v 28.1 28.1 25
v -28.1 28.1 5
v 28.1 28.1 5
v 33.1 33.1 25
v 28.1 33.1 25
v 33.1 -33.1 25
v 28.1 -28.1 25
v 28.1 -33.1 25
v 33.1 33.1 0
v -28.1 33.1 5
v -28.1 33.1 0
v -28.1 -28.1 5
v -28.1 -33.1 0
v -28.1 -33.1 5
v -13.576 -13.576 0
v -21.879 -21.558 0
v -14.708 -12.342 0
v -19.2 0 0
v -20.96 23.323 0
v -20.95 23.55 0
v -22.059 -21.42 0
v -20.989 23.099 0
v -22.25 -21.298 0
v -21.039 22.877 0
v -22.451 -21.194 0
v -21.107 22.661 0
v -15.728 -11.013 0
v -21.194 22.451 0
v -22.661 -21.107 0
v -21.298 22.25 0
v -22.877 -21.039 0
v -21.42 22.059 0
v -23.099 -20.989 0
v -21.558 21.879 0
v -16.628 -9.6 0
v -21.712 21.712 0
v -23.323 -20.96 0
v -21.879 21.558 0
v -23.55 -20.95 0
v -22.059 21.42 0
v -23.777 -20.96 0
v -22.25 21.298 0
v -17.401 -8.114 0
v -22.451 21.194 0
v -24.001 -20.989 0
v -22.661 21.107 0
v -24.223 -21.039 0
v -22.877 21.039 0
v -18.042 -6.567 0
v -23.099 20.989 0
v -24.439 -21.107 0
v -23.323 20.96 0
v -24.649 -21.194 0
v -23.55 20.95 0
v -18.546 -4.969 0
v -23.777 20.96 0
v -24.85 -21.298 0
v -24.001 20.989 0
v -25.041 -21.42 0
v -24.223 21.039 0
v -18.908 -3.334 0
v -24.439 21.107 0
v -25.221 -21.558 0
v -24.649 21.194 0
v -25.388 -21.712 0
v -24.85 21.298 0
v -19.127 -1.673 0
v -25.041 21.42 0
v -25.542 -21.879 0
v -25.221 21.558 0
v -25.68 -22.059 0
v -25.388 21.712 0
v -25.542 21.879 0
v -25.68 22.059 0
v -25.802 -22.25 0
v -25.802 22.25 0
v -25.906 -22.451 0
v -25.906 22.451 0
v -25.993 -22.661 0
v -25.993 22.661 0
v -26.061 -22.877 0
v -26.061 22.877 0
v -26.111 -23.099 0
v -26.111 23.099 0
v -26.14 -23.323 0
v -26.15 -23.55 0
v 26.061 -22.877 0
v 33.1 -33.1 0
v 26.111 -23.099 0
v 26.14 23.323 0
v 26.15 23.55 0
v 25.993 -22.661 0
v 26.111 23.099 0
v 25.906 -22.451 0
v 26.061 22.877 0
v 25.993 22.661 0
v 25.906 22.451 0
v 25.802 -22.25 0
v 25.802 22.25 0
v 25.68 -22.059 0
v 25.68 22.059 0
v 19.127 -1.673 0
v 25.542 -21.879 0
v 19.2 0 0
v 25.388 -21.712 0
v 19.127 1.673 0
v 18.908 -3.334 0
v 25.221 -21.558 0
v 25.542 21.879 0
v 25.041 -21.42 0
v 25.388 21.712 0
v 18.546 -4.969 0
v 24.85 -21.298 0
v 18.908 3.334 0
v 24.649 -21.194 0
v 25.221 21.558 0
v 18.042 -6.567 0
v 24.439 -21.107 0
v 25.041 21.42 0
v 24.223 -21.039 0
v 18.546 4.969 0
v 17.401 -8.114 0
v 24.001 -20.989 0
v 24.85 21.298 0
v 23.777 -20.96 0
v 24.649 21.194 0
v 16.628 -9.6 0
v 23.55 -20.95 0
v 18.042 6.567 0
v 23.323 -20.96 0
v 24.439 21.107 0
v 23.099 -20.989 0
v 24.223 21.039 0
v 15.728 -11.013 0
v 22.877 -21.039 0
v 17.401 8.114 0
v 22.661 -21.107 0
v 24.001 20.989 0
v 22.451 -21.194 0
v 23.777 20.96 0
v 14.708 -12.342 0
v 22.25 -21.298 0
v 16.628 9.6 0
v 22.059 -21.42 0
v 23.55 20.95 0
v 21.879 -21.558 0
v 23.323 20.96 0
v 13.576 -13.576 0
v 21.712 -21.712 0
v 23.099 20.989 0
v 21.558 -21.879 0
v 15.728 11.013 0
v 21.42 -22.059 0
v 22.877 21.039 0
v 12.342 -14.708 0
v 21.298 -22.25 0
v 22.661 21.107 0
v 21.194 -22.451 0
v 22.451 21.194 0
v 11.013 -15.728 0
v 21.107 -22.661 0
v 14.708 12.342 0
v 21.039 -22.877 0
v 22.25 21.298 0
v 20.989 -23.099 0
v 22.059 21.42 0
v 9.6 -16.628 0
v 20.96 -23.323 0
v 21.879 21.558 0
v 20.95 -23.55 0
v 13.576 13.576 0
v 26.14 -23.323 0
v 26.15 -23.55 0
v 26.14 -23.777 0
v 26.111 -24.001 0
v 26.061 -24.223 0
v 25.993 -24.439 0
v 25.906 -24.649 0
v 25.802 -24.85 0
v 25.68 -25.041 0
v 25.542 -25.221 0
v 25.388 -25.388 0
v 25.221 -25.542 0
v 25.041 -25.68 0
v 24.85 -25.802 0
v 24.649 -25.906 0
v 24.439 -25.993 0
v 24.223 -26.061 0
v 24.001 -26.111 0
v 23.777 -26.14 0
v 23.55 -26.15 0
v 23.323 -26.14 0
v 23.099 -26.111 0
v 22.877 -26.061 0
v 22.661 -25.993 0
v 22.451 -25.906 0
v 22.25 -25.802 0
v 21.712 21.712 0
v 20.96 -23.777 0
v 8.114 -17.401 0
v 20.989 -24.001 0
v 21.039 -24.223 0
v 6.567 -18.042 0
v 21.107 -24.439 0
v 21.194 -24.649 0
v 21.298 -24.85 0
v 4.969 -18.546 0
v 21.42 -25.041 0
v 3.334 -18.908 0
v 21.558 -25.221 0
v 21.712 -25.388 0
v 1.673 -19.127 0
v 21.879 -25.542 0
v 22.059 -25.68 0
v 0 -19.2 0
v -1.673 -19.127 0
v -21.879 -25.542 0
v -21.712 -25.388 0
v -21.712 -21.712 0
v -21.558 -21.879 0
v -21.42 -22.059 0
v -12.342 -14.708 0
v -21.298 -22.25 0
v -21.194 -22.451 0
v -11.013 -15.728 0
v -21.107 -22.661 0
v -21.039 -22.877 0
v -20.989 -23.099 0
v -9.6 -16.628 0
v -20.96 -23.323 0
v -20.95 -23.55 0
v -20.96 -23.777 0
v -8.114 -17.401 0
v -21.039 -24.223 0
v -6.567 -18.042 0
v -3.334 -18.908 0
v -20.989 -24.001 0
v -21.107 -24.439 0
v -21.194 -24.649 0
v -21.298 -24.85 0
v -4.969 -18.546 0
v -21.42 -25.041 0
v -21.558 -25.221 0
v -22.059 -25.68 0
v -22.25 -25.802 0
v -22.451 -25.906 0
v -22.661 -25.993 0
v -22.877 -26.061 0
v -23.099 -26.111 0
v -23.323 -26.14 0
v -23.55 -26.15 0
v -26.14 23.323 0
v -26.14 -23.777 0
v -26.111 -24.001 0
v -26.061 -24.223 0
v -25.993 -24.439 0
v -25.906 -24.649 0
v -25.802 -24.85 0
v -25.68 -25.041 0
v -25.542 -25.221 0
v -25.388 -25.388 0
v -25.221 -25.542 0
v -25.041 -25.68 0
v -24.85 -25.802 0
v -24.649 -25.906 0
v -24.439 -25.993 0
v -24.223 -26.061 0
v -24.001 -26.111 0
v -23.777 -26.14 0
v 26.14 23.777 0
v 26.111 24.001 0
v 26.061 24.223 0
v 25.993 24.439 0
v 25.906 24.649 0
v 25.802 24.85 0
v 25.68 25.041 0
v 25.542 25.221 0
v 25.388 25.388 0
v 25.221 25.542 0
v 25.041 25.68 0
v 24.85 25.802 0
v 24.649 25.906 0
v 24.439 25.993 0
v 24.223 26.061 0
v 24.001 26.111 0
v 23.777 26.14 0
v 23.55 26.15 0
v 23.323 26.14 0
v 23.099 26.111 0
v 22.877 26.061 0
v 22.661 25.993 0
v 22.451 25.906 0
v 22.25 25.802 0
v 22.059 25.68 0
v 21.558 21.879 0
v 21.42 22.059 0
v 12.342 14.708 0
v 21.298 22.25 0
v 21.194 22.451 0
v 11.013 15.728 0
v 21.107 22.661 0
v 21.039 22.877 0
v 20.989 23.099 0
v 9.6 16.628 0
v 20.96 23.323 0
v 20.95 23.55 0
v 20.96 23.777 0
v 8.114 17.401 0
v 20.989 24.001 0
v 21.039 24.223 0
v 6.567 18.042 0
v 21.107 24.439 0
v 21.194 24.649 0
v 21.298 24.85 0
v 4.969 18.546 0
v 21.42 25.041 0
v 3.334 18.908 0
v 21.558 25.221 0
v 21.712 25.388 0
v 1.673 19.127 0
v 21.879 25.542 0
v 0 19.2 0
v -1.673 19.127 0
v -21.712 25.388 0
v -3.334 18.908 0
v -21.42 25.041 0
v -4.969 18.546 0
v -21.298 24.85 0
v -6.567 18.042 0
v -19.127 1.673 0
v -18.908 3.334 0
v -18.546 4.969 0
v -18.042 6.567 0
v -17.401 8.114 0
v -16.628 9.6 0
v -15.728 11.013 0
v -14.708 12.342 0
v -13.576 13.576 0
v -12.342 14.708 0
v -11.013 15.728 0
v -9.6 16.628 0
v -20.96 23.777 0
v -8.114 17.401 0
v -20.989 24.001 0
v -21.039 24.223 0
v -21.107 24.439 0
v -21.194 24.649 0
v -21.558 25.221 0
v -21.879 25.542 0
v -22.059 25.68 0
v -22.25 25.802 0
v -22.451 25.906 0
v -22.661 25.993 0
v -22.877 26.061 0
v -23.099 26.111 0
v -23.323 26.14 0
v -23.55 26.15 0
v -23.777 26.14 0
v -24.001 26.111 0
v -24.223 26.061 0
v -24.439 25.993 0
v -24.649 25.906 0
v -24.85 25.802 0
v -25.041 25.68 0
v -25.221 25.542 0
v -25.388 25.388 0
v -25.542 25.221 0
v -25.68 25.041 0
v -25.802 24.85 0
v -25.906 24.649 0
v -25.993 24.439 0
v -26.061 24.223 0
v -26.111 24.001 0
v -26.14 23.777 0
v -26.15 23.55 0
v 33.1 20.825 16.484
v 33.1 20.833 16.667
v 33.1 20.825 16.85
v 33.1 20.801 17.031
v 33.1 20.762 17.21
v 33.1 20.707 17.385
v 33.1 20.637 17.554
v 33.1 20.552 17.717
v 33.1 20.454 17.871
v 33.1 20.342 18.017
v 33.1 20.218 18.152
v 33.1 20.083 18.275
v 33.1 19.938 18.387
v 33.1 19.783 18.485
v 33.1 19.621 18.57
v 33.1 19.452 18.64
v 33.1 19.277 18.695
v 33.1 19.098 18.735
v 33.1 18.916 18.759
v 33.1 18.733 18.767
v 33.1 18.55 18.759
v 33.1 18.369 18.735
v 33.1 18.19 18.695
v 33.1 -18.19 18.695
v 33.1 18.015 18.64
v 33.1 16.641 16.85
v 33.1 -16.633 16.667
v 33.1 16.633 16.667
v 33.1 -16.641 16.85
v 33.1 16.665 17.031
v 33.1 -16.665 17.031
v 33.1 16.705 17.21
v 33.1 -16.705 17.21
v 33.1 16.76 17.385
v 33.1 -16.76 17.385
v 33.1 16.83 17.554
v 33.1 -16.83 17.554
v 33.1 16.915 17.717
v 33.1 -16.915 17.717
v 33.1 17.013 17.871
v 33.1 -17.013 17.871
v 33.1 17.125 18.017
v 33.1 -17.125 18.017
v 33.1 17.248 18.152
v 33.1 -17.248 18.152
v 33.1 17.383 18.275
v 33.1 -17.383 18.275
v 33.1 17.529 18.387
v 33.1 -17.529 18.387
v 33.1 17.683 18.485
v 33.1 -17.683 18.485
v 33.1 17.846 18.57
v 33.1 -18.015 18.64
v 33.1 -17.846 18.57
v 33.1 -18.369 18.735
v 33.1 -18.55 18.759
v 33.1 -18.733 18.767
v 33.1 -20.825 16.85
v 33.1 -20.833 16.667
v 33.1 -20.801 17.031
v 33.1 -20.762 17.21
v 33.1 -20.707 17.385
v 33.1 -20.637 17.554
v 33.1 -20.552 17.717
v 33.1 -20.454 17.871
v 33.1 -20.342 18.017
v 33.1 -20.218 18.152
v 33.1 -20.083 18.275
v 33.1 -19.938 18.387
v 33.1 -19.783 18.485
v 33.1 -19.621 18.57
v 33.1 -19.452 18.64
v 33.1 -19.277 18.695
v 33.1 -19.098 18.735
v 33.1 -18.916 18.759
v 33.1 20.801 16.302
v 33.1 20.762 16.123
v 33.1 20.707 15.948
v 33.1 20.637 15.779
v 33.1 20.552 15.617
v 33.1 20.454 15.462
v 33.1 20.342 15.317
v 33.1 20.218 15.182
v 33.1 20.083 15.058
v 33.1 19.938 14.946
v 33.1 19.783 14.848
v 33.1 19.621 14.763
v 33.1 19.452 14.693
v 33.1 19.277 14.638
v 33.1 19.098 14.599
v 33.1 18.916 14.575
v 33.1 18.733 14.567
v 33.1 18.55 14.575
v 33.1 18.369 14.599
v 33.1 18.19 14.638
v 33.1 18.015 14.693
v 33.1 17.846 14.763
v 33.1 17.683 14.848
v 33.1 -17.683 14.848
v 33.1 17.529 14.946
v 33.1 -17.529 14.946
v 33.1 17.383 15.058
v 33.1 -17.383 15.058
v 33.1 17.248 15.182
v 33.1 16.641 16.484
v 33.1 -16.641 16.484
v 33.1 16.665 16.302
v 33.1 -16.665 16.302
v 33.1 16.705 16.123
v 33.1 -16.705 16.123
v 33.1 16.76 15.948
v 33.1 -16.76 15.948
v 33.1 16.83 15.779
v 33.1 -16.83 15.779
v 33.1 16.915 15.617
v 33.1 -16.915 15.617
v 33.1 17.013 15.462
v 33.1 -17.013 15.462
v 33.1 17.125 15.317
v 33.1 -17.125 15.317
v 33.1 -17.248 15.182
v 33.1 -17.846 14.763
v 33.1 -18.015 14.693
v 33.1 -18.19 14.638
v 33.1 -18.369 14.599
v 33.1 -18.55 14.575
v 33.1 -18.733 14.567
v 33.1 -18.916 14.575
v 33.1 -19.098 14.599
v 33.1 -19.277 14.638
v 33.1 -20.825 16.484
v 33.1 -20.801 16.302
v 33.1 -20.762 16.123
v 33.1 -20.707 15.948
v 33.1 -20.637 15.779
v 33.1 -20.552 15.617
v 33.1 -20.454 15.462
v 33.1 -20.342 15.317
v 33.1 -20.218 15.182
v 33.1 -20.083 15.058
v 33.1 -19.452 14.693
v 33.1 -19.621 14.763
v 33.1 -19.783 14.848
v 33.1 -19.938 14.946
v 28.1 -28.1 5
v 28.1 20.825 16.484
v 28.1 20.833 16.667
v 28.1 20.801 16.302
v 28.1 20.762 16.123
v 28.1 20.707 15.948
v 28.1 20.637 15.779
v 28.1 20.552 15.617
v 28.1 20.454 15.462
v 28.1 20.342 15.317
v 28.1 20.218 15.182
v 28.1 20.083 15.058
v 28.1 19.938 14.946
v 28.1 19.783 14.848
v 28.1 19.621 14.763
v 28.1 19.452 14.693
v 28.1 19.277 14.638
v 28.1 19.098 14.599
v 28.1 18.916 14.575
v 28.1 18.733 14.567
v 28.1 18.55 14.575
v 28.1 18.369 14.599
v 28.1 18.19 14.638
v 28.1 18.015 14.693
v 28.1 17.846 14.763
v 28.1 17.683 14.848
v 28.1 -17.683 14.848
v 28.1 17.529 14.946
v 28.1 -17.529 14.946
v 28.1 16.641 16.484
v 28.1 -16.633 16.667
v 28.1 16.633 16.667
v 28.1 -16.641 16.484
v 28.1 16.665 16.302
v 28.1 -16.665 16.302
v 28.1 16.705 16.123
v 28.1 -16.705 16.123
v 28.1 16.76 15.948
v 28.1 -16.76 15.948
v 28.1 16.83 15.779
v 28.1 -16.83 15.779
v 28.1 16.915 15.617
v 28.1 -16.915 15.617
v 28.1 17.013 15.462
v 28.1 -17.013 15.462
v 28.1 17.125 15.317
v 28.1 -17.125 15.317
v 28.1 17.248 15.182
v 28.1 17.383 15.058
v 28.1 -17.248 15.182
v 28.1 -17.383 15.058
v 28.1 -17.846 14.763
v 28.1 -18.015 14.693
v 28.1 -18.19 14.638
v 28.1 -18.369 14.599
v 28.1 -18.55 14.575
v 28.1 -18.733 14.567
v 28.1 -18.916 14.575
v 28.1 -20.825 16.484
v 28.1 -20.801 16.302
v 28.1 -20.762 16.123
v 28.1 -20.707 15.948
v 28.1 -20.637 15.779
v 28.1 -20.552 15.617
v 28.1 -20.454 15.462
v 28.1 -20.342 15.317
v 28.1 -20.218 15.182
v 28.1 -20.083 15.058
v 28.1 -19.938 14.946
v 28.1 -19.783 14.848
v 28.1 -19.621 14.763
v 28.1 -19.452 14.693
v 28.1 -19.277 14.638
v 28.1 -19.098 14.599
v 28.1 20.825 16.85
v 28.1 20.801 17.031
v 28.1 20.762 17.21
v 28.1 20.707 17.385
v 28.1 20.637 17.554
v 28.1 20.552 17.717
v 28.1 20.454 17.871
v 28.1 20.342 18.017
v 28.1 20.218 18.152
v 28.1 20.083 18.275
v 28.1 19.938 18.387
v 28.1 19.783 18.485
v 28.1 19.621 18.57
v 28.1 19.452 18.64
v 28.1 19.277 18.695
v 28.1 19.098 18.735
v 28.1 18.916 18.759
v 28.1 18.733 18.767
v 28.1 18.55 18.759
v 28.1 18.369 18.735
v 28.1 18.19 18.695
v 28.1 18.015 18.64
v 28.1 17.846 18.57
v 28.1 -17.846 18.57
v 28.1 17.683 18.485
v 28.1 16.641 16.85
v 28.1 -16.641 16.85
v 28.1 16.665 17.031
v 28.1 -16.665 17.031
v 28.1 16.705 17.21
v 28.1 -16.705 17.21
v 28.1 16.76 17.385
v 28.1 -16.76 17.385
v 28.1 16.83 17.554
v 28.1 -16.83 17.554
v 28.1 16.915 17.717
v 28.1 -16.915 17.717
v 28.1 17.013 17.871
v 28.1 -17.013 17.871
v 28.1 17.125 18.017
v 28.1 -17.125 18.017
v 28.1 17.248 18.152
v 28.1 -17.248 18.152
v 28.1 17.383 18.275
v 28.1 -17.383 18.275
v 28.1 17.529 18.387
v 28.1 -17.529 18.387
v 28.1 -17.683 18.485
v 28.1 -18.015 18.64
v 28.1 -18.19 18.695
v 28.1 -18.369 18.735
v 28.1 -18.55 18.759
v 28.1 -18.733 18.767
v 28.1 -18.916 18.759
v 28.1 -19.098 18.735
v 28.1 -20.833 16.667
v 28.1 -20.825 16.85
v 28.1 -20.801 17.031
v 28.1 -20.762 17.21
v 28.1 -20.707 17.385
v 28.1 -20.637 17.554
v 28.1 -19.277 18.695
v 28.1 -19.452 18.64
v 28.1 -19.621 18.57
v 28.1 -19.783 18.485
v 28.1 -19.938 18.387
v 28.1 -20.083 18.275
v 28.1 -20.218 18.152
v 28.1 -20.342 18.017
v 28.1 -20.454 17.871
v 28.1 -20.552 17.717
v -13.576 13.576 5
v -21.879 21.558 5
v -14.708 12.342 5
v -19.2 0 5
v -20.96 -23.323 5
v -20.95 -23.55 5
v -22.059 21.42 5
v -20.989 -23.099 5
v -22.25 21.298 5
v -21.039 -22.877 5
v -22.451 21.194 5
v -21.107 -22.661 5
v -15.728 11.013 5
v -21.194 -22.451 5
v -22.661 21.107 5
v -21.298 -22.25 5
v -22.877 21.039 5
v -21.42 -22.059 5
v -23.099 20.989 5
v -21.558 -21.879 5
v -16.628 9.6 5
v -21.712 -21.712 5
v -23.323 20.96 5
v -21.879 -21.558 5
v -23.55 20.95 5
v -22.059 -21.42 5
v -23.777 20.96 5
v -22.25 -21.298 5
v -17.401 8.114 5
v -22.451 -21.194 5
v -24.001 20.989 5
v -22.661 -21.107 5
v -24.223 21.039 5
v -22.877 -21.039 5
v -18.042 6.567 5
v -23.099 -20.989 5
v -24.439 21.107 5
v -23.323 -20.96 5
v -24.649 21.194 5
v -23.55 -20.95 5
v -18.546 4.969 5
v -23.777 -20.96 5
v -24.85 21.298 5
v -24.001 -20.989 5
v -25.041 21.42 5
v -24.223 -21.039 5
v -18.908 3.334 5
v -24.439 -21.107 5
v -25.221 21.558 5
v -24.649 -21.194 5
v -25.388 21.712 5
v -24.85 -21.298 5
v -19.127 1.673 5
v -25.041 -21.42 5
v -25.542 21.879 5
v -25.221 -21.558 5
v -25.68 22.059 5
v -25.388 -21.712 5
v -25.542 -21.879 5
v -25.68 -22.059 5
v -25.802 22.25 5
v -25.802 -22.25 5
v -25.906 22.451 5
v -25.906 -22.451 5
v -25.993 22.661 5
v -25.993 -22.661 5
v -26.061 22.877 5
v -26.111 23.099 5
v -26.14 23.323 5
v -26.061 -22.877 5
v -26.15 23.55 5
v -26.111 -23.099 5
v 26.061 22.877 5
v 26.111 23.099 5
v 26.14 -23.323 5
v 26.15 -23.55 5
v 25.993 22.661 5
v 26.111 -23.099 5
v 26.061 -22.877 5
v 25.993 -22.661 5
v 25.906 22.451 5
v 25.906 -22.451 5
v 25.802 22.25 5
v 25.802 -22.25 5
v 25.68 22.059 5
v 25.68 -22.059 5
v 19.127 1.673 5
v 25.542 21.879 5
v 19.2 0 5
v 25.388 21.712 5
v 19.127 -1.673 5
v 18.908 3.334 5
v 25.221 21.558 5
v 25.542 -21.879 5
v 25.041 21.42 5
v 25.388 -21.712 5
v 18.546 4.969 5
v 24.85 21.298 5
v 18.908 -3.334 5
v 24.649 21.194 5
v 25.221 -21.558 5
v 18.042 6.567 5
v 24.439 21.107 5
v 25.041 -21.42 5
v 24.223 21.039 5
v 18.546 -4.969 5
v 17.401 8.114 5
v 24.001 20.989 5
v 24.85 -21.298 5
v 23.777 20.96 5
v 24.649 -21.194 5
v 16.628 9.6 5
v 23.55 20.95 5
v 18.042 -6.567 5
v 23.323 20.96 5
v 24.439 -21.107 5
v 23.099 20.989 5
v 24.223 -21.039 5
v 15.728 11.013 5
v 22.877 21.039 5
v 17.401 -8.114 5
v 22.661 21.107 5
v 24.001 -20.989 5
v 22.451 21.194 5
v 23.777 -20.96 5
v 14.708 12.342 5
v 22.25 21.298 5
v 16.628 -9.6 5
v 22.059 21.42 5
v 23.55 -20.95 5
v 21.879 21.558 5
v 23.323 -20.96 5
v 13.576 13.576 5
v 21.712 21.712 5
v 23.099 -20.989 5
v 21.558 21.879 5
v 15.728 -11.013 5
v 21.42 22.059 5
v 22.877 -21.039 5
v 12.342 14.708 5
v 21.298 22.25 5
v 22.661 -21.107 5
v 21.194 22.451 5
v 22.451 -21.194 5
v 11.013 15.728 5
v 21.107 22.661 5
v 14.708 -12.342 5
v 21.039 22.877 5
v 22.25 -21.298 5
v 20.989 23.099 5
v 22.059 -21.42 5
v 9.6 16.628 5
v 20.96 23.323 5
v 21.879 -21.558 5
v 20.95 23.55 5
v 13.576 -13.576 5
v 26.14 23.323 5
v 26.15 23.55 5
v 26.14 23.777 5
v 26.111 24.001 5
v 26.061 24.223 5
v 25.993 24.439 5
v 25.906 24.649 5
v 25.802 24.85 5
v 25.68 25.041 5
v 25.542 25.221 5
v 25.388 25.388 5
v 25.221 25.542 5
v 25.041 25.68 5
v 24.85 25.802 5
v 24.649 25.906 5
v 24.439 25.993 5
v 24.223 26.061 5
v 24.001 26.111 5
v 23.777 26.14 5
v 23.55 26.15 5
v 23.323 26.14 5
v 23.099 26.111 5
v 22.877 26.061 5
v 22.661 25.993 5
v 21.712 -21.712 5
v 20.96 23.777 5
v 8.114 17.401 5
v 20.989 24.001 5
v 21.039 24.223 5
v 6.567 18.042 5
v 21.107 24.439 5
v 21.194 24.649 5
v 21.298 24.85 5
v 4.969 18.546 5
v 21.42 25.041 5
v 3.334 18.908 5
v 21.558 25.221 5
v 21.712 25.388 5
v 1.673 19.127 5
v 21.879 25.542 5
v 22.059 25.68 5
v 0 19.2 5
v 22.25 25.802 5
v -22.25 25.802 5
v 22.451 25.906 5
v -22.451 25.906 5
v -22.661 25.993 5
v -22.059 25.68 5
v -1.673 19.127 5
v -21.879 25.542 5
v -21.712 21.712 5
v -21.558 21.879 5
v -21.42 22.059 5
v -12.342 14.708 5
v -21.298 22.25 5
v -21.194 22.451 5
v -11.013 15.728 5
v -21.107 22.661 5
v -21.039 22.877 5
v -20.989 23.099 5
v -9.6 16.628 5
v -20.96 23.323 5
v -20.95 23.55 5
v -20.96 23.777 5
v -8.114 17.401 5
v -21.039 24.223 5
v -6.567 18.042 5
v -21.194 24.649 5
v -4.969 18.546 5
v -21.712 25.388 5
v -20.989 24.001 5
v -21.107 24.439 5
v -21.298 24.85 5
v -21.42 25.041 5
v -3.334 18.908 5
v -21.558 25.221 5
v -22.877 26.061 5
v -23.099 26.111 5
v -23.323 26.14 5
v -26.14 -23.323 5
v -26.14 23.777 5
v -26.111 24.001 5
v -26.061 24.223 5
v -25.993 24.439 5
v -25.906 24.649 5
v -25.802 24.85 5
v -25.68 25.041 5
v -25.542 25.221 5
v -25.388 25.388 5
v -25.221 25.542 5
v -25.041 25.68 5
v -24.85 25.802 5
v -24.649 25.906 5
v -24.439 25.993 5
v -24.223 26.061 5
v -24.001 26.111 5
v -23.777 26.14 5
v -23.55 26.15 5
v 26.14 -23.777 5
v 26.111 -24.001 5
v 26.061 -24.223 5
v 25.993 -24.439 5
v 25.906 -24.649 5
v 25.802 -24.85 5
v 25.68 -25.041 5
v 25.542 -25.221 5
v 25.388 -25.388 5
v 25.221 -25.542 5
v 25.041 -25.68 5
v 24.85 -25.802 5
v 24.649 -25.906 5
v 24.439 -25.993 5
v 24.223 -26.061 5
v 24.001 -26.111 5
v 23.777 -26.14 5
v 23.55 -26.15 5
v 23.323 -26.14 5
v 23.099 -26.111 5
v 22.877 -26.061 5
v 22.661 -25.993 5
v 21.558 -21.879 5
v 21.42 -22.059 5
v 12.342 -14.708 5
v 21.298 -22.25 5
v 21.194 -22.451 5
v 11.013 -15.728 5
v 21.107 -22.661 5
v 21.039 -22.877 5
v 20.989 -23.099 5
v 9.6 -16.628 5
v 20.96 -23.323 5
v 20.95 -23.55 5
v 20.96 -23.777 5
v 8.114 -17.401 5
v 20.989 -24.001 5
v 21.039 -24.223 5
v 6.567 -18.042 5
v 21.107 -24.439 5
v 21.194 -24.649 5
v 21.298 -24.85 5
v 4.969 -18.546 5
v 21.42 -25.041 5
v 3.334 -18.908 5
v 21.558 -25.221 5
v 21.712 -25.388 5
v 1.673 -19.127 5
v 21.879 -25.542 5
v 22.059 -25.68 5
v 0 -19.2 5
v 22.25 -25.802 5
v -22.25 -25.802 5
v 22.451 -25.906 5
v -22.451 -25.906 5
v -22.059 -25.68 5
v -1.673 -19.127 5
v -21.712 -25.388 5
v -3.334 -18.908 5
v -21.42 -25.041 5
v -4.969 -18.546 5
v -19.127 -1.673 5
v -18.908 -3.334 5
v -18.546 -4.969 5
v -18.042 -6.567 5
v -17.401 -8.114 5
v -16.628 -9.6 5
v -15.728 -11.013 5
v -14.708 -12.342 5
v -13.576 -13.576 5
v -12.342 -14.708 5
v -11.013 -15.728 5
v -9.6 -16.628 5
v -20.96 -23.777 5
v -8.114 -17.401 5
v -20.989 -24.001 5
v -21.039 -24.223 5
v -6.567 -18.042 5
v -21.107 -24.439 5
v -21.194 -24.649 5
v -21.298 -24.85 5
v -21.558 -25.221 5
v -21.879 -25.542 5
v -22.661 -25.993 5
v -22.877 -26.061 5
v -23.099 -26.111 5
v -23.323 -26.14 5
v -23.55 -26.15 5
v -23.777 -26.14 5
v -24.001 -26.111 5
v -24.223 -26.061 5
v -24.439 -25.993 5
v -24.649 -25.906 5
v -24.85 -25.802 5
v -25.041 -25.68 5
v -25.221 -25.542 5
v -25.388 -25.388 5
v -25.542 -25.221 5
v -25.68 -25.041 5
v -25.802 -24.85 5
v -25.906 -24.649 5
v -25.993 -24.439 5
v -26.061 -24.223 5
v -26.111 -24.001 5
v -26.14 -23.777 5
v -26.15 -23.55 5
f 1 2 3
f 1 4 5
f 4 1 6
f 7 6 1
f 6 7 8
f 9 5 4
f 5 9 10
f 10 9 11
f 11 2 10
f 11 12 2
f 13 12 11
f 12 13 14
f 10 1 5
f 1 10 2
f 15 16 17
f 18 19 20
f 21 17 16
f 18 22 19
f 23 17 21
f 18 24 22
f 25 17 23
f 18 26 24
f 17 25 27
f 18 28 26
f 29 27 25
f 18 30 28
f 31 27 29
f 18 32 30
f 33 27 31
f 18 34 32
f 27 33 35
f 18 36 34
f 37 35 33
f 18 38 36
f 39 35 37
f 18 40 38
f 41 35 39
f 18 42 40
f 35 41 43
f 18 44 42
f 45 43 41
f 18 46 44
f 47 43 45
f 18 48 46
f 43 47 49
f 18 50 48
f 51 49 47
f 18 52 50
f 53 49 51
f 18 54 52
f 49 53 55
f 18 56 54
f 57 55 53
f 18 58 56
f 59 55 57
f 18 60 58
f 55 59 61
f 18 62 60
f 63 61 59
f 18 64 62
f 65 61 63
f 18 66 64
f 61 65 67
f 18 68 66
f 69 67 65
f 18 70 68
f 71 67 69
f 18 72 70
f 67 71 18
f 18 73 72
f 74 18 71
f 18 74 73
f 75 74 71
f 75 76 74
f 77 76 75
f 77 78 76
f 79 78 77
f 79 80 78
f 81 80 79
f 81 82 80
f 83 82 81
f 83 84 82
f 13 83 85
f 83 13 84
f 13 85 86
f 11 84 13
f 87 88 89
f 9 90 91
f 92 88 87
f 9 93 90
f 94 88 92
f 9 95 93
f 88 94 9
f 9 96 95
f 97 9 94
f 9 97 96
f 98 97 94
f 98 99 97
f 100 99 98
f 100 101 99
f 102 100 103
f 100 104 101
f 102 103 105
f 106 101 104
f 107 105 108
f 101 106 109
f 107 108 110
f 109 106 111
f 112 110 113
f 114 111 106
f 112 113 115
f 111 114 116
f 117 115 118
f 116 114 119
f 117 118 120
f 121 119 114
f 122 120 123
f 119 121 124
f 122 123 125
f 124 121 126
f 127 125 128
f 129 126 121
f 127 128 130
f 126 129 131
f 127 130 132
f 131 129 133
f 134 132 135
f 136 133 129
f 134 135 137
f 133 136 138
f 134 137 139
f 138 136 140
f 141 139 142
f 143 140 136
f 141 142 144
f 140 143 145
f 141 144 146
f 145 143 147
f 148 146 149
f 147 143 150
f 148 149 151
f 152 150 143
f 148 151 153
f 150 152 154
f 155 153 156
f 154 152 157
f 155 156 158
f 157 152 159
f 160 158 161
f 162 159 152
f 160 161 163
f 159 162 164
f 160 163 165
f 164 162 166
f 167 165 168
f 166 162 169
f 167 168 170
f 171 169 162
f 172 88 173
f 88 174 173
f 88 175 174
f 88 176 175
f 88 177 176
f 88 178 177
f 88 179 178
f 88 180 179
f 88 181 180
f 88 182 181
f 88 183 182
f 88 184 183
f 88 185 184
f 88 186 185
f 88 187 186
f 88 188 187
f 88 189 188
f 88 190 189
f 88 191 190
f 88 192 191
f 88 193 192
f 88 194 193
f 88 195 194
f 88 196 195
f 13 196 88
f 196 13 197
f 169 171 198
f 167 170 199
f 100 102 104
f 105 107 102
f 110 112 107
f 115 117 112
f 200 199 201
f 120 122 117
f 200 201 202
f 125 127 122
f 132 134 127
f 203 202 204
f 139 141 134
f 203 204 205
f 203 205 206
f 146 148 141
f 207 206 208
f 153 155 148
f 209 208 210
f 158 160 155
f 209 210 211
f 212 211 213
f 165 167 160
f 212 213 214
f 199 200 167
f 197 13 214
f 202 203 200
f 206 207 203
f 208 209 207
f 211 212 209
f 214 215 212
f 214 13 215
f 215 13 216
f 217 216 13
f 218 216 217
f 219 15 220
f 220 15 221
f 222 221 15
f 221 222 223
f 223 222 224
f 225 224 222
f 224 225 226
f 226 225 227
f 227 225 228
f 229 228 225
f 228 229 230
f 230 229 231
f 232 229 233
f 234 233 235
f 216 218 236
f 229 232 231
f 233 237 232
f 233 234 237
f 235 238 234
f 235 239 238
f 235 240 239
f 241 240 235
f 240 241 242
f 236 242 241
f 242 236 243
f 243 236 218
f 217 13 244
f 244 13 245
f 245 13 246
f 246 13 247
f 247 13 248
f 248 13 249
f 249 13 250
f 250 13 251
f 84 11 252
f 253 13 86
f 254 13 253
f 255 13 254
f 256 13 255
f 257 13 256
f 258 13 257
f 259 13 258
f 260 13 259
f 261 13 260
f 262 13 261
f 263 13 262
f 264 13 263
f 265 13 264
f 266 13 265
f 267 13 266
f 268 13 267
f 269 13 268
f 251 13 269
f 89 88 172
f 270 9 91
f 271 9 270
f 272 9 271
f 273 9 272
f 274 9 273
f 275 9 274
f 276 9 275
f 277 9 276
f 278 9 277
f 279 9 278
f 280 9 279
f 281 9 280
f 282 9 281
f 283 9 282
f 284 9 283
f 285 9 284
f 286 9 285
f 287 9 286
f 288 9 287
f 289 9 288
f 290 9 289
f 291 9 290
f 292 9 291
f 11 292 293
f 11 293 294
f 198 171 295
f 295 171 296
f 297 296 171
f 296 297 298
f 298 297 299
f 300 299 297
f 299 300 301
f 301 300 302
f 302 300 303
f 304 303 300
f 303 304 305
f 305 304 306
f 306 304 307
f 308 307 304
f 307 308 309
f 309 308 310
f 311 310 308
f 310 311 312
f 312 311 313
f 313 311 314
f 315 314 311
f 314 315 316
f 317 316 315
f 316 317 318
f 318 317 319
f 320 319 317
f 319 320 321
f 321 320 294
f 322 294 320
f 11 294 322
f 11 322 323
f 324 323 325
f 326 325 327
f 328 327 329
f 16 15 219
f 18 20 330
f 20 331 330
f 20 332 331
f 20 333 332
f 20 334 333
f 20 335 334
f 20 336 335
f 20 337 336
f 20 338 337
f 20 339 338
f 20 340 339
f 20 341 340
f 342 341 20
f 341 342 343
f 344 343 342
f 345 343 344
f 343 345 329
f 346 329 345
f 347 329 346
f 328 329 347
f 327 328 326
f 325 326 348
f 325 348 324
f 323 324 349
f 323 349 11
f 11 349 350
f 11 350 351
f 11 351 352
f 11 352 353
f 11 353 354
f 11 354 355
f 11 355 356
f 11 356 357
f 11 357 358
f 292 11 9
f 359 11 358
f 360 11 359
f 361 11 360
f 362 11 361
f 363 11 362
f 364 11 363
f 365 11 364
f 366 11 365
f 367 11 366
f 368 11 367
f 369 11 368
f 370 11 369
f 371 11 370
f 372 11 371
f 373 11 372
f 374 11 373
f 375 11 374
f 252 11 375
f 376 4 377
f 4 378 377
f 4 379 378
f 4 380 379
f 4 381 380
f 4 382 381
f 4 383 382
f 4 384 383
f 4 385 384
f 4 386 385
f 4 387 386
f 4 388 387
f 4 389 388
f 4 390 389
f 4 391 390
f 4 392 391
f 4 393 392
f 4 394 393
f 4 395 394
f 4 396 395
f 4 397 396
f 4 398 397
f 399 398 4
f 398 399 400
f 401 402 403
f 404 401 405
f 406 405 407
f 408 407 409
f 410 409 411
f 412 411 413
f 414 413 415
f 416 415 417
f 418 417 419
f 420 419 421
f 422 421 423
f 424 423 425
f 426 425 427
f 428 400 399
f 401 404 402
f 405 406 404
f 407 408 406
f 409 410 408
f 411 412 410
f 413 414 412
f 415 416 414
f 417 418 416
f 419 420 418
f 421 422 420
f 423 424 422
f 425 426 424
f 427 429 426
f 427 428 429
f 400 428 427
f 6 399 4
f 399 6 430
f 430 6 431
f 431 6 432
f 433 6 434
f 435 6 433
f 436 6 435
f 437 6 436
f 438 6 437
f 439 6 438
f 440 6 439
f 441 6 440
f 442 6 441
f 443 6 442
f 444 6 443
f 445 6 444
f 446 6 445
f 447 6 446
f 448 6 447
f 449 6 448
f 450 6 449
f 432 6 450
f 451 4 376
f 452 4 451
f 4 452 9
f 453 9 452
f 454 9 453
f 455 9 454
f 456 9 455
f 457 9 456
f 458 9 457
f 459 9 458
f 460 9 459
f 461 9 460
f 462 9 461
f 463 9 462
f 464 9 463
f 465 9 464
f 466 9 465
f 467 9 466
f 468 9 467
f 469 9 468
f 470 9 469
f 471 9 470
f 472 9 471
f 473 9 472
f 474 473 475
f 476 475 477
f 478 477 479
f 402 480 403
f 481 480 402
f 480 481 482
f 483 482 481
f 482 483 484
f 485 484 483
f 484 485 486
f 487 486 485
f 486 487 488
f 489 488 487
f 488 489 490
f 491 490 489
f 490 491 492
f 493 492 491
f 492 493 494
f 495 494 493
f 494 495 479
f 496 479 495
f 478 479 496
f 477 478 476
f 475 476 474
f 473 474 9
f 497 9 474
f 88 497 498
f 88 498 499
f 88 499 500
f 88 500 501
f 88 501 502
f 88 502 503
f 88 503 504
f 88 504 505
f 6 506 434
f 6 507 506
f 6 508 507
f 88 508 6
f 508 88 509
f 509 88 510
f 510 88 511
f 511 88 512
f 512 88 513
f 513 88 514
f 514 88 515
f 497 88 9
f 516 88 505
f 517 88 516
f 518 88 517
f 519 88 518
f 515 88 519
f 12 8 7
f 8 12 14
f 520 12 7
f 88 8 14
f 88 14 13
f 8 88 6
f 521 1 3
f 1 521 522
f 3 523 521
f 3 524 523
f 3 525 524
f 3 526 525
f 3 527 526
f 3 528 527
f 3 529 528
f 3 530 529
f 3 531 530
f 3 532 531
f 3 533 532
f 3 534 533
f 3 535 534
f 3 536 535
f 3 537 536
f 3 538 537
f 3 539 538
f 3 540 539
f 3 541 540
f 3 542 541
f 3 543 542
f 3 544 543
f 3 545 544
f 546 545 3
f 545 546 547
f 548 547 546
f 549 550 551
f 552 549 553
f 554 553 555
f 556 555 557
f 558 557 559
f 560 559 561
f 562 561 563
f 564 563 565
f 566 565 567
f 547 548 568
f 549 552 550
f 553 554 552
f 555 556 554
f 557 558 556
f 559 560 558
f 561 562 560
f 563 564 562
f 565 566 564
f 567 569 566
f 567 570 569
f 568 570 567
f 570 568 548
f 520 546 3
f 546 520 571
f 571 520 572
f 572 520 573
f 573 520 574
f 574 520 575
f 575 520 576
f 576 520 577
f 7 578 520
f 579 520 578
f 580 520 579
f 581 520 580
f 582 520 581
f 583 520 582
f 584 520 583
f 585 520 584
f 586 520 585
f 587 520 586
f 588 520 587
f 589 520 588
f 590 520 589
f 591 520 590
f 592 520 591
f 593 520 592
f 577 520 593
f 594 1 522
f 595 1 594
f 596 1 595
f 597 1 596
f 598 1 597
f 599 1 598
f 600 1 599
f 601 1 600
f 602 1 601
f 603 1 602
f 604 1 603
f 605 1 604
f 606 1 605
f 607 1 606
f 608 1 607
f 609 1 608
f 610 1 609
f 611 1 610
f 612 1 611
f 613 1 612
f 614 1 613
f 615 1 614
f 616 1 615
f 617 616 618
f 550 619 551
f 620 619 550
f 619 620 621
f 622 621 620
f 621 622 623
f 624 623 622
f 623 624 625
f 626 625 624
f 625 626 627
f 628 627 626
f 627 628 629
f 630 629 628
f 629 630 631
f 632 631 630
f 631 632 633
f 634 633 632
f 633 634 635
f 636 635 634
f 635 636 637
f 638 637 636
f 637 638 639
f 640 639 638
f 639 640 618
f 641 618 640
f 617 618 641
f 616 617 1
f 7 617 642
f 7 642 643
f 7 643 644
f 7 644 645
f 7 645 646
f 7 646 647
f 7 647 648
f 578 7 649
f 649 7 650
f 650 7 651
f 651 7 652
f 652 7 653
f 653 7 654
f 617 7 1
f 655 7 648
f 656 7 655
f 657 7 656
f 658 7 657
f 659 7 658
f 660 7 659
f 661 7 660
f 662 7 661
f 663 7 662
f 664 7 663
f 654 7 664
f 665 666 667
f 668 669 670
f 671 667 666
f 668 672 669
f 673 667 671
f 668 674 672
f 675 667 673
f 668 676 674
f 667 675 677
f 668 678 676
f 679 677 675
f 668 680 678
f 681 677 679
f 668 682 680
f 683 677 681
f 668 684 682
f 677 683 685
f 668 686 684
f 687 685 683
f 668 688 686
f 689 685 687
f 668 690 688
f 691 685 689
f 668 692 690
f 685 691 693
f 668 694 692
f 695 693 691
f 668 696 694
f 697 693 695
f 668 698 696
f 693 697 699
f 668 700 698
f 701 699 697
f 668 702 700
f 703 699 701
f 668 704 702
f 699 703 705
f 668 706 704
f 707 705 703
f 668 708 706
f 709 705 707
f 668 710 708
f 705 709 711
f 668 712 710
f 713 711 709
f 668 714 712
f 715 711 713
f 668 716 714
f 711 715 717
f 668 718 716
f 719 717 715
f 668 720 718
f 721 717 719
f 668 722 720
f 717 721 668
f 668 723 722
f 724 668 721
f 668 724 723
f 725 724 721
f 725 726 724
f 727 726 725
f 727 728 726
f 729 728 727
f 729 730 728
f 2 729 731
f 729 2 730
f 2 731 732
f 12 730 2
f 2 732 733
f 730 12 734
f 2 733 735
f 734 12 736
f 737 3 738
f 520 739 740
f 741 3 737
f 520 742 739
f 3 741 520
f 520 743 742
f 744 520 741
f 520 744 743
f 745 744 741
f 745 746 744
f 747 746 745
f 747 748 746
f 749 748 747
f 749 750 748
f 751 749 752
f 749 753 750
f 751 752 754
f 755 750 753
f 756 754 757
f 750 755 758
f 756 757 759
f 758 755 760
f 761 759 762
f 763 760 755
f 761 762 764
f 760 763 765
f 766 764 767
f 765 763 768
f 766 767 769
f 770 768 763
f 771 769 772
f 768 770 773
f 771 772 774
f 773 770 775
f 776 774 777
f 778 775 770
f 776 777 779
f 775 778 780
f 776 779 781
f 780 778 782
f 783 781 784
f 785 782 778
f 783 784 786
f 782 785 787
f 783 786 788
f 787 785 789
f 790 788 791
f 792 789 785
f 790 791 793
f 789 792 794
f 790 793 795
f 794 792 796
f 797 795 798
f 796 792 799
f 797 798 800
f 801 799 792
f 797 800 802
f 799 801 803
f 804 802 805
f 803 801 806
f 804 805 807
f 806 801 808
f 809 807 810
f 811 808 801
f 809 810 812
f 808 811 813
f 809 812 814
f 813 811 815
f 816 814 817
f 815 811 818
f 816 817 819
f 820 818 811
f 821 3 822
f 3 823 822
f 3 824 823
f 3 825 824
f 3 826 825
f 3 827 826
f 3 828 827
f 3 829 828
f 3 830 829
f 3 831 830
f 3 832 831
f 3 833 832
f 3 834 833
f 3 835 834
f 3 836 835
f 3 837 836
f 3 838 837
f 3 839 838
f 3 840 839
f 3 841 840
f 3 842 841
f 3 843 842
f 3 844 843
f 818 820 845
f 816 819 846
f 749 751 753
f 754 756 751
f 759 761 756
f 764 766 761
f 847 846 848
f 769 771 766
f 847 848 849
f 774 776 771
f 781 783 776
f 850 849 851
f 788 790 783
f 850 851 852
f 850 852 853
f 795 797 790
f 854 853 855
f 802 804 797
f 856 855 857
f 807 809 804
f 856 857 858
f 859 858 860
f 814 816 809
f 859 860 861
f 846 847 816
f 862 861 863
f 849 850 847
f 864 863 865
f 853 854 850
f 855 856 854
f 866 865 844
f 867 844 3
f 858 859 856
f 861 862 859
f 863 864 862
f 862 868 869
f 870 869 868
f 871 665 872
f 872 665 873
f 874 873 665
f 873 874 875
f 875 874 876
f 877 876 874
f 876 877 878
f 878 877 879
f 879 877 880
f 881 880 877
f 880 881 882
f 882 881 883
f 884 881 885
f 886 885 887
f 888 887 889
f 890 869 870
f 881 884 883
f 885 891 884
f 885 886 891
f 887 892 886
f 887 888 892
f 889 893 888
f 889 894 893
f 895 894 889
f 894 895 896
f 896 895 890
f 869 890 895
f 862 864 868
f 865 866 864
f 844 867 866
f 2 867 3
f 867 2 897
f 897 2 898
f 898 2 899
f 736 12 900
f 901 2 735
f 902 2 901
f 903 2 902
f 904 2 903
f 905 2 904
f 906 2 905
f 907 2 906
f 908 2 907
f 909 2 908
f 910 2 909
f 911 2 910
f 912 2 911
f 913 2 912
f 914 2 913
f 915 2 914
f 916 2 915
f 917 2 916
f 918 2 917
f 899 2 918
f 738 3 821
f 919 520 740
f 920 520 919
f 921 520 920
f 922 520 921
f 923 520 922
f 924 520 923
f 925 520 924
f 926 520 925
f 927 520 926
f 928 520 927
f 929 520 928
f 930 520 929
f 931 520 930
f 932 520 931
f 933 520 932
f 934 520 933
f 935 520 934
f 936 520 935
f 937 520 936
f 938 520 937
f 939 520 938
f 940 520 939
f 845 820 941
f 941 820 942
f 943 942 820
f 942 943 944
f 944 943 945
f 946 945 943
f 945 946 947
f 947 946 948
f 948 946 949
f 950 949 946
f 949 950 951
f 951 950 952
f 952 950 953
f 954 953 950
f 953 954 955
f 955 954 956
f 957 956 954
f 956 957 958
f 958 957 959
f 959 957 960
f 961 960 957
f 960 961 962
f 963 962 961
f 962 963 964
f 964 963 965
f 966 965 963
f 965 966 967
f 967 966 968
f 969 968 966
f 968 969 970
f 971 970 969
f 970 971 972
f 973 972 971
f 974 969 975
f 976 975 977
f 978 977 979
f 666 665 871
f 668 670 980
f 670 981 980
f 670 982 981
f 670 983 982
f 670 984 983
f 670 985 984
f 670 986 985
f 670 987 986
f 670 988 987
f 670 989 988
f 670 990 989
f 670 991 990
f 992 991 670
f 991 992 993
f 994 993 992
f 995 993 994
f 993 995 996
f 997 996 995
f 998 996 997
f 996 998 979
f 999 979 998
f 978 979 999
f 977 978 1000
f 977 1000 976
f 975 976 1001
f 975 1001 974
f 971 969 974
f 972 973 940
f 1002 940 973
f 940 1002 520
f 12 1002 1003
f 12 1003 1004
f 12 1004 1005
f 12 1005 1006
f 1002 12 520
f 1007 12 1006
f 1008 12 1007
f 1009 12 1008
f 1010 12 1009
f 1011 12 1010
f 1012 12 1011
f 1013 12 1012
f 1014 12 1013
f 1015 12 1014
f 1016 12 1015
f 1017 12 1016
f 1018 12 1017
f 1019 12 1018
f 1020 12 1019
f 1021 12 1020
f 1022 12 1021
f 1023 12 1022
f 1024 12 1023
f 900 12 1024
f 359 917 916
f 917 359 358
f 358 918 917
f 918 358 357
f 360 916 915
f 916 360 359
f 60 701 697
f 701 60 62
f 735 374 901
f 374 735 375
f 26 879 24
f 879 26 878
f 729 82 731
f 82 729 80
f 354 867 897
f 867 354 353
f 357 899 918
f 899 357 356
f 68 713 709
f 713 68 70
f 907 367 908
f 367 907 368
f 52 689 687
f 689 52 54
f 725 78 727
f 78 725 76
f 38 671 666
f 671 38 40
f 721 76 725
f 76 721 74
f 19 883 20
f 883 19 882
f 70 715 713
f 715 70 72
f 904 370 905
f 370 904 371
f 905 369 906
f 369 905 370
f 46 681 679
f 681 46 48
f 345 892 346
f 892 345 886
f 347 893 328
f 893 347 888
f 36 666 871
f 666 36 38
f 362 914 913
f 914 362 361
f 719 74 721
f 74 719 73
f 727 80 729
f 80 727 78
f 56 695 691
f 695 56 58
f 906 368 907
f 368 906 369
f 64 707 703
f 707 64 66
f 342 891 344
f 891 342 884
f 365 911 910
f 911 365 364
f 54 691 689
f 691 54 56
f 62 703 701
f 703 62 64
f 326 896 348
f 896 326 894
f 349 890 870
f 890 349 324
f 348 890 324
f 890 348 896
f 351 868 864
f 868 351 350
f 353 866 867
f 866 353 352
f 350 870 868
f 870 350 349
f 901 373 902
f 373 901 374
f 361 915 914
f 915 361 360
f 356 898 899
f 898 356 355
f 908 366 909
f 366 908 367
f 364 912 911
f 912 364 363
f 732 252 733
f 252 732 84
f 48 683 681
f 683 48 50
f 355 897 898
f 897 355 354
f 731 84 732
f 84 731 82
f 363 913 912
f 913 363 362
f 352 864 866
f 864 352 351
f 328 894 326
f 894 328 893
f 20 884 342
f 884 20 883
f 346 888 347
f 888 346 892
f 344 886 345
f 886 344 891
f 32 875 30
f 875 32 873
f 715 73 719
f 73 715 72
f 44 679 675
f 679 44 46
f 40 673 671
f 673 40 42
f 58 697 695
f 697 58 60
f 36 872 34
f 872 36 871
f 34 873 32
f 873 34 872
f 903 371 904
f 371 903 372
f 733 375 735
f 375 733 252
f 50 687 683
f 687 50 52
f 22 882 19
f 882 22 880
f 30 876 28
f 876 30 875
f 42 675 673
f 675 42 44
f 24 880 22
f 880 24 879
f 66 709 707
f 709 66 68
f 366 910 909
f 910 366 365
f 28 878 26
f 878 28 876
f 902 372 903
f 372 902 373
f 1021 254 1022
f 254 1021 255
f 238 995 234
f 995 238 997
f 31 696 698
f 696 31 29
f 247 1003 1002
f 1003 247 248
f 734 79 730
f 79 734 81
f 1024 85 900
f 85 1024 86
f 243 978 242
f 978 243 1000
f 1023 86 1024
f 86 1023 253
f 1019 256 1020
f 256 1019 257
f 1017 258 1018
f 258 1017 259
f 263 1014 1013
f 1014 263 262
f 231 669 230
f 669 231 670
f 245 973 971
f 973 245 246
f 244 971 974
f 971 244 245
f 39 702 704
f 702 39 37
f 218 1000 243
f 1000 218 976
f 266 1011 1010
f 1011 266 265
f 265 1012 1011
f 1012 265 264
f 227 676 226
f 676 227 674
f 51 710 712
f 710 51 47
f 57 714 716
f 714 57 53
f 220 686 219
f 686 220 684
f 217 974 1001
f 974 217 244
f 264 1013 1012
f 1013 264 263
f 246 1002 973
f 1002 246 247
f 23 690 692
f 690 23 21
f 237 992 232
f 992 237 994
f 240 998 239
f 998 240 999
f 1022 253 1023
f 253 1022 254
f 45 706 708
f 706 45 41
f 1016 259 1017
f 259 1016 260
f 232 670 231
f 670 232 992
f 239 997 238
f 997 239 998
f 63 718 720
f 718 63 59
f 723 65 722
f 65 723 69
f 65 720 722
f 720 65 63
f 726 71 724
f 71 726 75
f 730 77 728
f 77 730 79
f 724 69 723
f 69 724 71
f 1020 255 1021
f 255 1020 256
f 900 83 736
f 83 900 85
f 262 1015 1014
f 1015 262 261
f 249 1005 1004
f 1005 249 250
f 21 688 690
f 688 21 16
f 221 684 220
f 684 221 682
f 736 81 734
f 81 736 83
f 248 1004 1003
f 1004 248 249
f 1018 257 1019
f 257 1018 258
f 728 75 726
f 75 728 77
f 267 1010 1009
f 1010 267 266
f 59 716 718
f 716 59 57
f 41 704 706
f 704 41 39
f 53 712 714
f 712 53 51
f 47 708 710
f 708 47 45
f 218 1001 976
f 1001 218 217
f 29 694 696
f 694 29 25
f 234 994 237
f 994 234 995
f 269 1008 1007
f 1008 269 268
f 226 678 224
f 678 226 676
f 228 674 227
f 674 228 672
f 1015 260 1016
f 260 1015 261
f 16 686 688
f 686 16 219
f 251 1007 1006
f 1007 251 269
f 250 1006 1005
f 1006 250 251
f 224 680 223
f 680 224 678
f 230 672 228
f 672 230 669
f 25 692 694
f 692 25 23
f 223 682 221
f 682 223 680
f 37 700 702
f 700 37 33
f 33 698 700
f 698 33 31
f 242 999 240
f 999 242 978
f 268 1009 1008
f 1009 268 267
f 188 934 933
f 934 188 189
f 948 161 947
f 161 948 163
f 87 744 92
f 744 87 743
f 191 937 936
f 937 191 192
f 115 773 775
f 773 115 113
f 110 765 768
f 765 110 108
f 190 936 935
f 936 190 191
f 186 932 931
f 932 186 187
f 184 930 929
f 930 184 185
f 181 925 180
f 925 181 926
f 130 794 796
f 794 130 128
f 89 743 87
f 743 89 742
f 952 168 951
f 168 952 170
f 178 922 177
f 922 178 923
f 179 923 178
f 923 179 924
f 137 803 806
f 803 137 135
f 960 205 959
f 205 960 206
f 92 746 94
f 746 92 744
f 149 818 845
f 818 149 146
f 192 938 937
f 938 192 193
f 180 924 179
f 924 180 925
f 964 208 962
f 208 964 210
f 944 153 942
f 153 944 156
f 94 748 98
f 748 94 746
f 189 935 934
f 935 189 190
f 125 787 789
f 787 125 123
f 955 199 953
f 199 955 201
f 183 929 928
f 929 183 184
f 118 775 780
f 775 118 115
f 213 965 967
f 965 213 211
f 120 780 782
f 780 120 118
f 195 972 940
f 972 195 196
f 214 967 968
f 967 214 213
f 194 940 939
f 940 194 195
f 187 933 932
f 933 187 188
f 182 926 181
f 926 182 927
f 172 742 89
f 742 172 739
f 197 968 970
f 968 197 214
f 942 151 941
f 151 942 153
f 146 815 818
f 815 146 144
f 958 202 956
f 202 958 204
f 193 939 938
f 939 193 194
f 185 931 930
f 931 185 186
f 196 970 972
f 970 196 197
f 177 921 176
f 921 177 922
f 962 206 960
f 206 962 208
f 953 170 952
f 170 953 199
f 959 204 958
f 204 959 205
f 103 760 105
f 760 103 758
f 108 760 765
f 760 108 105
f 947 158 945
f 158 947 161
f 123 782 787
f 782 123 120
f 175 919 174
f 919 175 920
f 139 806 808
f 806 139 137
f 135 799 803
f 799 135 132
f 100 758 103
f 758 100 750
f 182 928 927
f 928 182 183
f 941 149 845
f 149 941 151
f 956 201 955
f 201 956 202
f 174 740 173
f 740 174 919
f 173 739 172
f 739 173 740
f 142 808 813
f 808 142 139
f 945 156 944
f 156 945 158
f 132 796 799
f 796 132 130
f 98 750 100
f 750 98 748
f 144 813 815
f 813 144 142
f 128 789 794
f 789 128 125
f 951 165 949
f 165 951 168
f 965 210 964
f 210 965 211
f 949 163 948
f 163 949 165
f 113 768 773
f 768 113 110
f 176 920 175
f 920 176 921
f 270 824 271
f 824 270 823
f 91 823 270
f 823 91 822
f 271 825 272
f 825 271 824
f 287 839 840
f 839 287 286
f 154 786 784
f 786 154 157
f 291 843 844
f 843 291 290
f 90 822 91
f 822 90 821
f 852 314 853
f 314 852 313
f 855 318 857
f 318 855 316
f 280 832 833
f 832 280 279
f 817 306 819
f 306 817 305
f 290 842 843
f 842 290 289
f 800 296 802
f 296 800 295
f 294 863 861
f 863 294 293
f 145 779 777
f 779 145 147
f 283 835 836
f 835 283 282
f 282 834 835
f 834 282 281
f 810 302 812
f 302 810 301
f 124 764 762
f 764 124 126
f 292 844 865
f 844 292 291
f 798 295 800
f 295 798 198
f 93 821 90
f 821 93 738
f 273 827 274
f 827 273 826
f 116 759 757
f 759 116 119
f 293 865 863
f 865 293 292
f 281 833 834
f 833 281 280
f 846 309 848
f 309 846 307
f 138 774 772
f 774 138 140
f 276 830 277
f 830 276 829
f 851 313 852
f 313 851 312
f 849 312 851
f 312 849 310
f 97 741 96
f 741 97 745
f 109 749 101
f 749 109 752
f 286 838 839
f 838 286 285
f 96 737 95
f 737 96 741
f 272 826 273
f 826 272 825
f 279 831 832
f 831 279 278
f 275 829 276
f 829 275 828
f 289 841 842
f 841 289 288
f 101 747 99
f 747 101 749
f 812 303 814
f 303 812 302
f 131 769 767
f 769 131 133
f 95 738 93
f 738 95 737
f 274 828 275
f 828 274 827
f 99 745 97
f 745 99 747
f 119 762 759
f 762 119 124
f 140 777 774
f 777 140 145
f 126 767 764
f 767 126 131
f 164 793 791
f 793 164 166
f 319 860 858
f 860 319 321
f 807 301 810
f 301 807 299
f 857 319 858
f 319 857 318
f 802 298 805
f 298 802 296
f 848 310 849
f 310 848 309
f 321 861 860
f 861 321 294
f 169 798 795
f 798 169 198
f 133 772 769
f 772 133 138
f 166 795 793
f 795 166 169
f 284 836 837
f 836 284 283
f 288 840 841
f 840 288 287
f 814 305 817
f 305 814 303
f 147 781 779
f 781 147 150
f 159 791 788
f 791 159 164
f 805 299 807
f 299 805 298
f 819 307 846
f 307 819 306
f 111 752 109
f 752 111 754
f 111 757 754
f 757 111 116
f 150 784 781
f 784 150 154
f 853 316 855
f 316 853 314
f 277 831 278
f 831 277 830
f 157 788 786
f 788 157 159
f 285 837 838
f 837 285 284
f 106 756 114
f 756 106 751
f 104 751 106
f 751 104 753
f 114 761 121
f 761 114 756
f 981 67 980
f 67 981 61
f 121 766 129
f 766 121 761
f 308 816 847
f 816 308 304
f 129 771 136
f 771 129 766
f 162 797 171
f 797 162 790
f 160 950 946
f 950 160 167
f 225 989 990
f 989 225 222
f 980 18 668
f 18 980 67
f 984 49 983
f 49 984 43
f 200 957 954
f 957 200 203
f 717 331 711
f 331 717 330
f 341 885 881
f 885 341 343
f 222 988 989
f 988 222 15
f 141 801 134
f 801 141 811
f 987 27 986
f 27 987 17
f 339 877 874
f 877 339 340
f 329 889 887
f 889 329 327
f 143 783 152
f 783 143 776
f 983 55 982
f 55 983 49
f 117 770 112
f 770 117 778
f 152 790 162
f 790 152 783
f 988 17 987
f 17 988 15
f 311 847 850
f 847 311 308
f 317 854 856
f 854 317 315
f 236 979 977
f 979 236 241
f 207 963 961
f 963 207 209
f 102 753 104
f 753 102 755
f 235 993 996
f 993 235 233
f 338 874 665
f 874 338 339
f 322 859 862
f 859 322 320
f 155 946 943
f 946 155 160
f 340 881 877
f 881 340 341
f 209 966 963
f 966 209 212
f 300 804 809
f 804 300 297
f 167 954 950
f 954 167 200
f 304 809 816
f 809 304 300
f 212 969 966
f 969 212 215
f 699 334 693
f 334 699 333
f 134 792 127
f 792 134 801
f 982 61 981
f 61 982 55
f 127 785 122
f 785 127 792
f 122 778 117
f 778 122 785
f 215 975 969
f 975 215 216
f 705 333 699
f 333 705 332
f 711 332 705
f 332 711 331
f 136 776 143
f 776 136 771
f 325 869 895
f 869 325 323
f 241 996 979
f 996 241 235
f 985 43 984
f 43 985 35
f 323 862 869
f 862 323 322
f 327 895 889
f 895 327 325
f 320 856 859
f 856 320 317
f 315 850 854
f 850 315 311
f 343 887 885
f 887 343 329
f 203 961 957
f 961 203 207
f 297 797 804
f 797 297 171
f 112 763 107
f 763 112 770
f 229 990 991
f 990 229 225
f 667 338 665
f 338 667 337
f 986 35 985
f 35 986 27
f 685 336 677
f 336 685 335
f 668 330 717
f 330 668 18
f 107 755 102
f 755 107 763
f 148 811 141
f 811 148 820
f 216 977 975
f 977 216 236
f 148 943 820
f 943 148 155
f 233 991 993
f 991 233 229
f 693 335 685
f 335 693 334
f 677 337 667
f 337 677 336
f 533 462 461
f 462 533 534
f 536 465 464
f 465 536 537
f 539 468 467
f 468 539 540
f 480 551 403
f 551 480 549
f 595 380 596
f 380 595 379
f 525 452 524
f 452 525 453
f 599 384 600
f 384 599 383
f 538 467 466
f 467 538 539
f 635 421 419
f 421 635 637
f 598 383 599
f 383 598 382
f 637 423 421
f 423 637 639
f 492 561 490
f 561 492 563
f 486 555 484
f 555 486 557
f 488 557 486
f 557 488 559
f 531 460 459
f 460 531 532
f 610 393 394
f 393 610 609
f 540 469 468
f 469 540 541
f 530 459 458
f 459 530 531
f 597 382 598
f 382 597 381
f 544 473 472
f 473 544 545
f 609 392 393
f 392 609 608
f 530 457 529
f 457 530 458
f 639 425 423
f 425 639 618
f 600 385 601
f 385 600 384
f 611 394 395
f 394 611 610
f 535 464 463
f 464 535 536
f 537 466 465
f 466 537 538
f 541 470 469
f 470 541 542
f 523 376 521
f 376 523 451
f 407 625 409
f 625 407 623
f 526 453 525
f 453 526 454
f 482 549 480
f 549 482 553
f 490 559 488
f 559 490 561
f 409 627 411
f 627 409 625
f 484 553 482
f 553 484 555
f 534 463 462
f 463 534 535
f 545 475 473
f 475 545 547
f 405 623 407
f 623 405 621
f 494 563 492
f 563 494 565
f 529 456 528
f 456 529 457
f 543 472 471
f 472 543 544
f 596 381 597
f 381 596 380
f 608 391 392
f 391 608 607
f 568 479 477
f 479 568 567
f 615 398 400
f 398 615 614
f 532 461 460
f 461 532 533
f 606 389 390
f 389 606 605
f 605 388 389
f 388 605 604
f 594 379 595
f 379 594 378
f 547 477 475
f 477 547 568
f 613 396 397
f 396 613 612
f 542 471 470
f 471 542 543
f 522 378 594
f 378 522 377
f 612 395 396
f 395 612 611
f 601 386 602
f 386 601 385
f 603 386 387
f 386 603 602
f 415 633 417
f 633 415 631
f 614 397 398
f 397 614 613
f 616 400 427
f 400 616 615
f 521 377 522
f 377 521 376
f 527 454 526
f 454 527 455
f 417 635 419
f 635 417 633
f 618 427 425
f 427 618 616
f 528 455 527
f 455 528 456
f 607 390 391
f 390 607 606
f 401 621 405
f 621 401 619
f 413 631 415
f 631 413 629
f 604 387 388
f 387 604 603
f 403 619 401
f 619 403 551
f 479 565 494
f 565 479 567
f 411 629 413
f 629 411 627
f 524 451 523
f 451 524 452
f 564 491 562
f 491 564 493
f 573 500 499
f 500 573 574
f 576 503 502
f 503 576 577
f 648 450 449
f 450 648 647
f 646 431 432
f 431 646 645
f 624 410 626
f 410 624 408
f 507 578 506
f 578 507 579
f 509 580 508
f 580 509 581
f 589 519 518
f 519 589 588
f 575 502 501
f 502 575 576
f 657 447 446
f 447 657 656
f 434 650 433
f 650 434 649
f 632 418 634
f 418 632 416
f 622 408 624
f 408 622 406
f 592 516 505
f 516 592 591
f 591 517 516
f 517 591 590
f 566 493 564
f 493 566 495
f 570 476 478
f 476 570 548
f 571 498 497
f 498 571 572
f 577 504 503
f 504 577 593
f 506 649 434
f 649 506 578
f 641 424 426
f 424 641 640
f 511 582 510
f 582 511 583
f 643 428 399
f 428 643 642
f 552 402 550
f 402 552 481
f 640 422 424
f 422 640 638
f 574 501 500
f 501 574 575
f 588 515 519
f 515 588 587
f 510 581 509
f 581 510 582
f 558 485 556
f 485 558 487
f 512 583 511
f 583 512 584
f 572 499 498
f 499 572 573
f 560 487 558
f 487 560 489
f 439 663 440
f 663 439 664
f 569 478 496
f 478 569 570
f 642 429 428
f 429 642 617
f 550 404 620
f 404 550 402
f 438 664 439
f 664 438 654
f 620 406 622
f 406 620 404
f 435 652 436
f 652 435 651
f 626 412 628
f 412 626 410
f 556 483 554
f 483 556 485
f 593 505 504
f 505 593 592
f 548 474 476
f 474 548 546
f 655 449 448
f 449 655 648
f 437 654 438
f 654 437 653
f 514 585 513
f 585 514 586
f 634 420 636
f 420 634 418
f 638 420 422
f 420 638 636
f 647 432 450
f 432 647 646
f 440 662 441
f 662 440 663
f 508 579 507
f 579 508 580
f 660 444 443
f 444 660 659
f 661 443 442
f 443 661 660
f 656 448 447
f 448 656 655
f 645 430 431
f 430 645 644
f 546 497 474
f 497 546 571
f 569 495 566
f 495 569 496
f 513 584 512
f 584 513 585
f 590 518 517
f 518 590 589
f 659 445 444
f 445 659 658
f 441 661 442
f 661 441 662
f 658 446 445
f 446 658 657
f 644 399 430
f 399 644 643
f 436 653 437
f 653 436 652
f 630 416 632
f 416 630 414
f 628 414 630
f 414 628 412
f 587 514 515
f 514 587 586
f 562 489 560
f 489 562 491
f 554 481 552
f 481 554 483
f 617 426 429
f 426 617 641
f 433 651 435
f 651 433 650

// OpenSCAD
ThicknessStepper = 5;
WidthStepper = 56.2;
ScrewsStepper = 47.1;
HeightFoot = 25;

//change from stepper to bearing
Stepper=1;

$fn=72;
difference(){
    union(){
translate([WidthStepper/-2, WidthStepper/-2,0])
    cube([WidthStepper,WidthStepper,ThicknessStepper]);
translate([WidthStepper/2, WidthStepper/-2,0])
    cube([5,WidthStepper,HeightFoot]);

for(m=[1,0]){
mirror([0,m,0])side();
}
}

if(Stepper == 1){
//hole for stepper
translate([0,0,-0.1])cylinder(r=19.2, h=ThicknessStepper+0.2);
    
ScrewHoles();
}
else
{
translate([0,0,-0.1])cylinder(r=8, h=ThicknessStepper+0.2);
    
translate([0,0,1])cylinder(r=11.1, h=ThicknessStepper+0.2);    
}





for(i=[1,-1]){
translate([WidthStepper/2-0.1,i*WidthStepper/3,2*HeightFoot/3])
rotate([0,90,0])cylinder(r=2.1, h=ThicknessStepper+0.2);
}
}

module ScrewHoles(){
    for(r=[1:4])
{
    rotate([0,0,90*r])translate([ScrewsStepper/2,ScrewsStepper/2,-0.1])cylinder(r=2.6, h=ThicknessStepper+0.2);
}
}

module side()
{
    hull(){
translate([WidthStepper/-2, (WidthStepper/-2)-ThicknessStepper,0])
cube([WidthStepper, 5,5]);
        
translate([WidthStepper/2, (WidthStepper/-2)-ThicknessStepper,0])
cube([5, ThicknessStepper,HeightFoot]);
    }
}
